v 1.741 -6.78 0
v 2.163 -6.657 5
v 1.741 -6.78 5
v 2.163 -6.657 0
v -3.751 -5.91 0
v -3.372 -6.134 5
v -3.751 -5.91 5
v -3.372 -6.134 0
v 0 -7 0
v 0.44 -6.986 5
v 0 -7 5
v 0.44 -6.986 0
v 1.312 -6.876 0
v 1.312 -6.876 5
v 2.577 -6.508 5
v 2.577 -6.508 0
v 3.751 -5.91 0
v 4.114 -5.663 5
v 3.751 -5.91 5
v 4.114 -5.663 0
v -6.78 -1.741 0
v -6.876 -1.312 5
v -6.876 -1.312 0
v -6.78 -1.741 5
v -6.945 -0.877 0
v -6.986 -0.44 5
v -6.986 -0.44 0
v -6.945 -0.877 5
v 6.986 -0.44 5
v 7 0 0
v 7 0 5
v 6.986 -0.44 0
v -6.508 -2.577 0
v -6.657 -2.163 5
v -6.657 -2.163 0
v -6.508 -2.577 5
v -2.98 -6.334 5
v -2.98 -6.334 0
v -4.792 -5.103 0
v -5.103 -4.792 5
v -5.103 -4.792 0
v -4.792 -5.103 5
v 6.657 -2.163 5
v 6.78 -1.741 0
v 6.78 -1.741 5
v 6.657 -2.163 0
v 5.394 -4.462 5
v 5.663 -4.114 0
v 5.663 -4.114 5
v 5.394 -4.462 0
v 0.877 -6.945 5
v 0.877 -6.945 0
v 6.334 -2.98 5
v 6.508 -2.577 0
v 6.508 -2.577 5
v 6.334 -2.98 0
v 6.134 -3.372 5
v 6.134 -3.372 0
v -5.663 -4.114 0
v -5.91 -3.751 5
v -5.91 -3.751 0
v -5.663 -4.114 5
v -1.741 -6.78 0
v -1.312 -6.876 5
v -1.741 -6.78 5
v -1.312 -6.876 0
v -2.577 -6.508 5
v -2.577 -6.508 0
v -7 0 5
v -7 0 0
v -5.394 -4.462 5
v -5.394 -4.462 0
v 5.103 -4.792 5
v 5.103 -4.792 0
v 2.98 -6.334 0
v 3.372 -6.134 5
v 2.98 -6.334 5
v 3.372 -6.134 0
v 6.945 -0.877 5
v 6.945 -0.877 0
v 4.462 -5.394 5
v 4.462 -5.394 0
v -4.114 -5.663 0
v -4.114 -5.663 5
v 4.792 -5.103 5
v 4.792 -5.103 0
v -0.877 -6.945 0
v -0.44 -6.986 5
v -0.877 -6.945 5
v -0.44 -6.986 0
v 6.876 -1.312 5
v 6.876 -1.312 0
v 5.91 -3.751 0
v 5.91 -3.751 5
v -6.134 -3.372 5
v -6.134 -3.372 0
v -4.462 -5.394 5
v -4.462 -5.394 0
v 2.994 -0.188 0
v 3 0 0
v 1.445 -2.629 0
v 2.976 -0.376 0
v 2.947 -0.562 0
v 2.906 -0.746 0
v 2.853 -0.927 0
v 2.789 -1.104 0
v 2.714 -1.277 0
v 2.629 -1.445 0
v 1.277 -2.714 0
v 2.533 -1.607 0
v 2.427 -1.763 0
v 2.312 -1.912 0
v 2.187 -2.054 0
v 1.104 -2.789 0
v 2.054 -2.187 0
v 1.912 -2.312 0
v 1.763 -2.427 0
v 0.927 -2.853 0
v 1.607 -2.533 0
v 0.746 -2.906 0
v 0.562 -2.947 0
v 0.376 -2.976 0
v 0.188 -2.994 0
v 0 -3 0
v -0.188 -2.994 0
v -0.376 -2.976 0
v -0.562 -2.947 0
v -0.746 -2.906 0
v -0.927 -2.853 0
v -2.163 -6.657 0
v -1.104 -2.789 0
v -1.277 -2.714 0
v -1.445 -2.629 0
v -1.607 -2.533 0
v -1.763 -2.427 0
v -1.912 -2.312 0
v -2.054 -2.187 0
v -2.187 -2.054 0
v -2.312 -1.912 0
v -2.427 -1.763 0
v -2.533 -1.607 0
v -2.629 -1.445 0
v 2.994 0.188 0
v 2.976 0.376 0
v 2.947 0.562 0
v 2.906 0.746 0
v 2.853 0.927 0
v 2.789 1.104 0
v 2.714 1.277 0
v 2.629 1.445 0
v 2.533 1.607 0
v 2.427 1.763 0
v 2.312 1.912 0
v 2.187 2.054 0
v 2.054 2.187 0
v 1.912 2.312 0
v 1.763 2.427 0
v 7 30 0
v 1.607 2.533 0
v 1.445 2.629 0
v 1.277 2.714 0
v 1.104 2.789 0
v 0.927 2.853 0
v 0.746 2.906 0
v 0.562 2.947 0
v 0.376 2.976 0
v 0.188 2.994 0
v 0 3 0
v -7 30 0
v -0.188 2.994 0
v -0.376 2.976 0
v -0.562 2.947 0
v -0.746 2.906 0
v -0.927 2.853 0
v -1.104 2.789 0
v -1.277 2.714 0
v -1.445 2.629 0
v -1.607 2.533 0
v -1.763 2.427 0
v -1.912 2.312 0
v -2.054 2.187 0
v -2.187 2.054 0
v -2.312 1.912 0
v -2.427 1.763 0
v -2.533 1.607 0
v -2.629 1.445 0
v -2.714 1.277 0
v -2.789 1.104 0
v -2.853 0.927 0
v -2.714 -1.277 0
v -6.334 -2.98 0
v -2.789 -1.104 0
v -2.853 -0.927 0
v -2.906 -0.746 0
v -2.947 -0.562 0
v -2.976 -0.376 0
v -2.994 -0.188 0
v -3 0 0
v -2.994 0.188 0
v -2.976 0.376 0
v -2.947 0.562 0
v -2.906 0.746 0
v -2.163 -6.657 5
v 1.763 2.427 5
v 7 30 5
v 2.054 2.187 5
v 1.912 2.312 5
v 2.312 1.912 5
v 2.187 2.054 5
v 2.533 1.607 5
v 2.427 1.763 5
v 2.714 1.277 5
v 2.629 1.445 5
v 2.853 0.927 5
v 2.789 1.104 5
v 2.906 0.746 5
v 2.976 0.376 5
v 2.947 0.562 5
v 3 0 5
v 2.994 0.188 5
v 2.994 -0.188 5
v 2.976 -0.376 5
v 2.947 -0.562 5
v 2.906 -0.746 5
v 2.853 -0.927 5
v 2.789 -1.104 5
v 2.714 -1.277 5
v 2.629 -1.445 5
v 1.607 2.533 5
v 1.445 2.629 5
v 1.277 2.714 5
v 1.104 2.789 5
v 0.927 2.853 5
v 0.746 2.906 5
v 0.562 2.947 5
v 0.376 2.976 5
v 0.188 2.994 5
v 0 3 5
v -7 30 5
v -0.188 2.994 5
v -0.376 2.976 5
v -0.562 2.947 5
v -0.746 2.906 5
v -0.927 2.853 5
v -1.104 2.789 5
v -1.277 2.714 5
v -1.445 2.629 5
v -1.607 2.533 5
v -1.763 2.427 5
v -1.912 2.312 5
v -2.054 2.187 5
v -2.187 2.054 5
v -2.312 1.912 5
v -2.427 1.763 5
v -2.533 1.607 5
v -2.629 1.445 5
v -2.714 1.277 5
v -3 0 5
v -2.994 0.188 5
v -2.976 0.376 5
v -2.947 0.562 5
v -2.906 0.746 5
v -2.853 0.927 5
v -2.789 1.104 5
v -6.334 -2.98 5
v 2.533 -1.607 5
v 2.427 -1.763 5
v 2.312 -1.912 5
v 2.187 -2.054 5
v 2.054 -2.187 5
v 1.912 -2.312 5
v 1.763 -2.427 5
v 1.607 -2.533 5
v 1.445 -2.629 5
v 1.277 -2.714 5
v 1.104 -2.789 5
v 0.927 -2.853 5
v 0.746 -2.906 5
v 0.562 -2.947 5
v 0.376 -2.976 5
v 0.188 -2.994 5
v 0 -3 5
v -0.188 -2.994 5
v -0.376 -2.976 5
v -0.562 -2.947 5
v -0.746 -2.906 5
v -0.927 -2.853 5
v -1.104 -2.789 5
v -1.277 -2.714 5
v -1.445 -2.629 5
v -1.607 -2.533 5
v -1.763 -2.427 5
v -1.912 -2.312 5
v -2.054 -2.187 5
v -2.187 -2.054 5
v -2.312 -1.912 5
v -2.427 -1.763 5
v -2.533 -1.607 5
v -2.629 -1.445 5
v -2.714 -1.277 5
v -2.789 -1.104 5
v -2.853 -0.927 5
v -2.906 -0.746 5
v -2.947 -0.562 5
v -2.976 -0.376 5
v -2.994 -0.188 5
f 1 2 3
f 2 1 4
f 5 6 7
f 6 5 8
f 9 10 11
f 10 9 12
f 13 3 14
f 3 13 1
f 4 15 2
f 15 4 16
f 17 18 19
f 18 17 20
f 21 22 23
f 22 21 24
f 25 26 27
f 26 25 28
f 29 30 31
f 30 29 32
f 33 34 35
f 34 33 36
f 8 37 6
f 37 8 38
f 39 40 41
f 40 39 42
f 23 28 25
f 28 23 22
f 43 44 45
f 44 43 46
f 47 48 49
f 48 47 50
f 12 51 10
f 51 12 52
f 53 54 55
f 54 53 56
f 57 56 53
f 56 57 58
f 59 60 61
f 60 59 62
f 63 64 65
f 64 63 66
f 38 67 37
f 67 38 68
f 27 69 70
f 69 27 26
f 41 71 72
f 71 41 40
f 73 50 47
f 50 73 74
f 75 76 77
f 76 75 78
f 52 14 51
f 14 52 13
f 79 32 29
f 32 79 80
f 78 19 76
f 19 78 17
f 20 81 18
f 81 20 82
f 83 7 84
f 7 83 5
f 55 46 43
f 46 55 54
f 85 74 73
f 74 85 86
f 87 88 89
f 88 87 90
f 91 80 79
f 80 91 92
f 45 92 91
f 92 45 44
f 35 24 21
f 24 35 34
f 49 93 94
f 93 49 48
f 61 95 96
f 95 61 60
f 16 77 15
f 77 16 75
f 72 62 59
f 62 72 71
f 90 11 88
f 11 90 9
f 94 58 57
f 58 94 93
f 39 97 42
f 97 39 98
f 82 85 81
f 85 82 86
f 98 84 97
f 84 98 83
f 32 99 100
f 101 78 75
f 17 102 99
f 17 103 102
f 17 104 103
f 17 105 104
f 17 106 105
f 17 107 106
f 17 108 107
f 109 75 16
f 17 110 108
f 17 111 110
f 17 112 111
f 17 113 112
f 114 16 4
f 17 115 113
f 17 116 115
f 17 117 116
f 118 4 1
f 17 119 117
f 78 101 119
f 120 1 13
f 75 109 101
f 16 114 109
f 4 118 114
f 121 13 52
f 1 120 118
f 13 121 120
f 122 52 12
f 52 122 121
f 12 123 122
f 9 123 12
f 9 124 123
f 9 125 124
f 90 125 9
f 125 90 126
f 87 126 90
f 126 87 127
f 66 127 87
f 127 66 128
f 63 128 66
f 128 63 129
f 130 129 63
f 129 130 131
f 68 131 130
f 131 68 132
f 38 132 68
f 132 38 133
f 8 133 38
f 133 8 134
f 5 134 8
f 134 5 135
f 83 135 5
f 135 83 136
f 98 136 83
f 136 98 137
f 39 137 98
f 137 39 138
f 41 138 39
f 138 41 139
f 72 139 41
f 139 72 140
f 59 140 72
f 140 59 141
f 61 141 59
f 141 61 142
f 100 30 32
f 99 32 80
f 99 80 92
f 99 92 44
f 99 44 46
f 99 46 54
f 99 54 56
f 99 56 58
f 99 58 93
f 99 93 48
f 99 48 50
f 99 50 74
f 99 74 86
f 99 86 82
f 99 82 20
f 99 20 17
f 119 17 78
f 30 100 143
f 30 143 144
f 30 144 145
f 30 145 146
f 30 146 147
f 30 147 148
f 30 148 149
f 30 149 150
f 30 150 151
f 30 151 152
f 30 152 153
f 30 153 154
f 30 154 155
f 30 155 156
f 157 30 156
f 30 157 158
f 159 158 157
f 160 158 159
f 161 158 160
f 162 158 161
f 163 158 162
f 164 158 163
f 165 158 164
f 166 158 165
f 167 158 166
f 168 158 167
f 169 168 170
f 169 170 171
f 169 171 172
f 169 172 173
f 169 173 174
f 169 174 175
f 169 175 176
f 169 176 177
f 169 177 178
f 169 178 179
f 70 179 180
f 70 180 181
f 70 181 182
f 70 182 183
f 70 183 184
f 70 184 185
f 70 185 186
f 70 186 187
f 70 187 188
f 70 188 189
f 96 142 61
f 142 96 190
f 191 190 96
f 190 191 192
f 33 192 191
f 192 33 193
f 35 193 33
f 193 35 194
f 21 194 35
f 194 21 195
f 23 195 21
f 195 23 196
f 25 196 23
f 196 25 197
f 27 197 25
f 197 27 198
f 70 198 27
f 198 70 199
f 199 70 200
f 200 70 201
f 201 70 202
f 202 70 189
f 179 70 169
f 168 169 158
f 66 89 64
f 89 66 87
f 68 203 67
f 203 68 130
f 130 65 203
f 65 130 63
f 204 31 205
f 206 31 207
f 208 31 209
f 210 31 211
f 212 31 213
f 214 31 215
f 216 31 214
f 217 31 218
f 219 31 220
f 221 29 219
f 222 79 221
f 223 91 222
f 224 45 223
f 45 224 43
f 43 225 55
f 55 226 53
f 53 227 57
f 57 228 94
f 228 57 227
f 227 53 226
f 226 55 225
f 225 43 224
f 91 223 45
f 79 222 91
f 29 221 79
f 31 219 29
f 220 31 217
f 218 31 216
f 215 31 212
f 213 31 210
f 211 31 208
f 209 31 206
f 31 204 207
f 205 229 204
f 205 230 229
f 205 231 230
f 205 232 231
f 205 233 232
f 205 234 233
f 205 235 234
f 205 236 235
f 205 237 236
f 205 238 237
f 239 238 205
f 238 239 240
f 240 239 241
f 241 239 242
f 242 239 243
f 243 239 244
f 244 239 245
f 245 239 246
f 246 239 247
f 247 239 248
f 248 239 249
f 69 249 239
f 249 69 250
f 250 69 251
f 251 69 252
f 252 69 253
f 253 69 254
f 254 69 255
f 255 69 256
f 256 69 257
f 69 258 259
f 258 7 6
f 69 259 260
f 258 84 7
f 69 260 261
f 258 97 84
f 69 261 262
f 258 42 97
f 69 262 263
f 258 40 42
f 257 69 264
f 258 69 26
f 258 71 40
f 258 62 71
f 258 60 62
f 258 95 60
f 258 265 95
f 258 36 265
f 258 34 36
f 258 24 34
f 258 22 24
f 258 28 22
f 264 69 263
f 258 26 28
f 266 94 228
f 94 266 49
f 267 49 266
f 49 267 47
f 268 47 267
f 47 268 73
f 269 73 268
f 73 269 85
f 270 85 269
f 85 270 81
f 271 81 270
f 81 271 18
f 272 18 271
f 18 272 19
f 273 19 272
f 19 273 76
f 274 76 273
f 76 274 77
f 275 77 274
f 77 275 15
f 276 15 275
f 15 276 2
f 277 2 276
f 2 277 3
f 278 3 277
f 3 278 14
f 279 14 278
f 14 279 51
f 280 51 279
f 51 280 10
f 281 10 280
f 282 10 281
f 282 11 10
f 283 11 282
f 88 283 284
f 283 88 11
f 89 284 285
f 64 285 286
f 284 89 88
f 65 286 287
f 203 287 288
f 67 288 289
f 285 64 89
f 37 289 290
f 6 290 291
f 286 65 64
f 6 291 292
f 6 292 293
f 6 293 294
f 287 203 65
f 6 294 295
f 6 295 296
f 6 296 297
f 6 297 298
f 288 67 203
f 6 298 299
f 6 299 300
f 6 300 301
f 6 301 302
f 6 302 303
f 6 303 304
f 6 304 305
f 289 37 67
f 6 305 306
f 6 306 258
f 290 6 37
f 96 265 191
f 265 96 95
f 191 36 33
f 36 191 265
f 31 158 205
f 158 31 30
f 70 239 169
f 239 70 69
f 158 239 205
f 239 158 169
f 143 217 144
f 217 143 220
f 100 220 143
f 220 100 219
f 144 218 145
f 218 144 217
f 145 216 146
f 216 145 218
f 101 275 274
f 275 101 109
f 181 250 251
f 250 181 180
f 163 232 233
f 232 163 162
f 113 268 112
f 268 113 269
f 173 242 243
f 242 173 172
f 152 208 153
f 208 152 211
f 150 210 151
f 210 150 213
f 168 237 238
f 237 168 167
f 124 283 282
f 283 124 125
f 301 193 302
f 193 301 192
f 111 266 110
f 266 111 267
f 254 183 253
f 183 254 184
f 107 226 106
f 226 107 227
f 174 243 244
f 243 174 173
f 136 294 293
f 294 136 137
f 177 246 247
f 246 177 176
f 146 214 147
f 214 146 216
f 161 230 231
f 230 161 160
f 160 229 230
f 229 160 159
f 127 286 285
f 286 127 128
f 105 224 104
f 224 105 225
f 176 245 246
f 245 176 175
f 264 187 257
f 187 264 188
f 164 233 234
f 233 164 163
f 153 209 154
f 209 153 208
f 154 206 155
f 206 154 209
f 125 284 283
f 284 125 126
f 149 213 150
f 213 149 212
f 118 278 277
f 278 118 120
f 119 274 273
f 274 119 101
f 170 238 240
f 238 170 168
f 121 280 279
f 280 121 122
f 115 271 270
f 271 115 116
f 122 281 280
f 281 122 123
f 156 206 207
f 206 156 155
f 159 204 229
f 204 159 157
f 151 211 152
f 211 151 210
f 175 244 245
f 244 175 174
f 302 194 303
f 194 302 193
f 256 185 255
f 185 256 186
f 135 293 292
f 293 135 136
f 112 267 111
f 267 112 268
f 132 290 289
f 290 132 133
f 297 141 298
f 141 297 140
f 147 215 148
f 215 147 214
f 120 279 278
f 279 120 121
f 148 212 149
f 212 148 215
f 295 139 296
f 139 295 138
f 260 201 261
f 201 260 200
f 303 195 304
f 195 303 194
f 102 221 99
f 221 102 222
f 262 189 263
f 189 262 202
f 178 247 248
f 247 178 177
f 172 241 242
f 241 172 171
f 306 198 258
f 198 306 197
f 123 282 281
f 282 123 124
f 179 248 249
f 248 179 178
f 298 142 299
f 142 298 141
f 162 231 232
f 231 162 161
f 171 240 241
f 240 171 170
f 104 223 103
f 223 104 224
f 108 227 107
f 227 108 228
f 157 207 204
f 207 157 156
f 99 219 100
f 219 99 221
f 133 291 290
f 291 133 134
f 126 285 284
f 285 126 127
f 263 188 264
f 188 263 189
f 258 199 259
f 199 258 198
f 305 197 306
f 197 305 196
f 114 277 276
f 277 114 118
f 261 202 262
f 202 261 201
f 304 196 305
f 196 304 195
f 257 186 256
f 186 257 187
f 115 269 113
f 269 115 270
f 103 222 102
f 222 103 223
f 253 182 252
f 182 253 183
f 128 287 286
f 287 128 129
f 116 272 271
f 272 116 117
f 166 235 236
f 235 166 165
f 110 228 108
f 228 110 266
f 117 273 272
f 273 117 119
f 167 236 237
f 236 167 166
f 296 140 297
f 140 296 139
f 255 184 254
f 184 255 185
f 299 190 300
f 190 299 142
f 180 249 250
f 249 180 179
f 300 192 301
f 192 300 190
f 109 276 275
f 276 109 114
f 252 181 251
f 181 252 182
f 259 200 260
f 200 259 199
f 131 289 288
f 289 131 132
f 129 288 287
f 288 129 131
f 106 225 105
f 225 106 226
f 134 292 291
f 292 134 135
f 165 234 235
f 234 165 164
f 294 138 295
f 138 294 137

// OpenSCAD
act_r = 10.5;
act_hole_r = 3;
act_hole_d_to_end = 4;
act_hole_d_to_box = 8;
act_len = act_hole_d_to_end+act_hole_d_to_box+2*act_hole_r;
box = [39,39,39];
act_hole_shaft_len = 50;
width = 5;
slop = 1;
upness = 30;

$fn = 100;

echo(act_len);

module actuator () {
  hole_goes=act_hole_d_to_box+act_hole_r;
  translate([-box[0],-box[1]/2,-box[2]/2]) cube(box);
  difference() {
    rotate([0,90,0]) cylinder(act_len, act_r, act_r);
    translate([hole_goes, act_hole_shaft_len/2 , 0 ])
      rotate([90,0,0])
      cylinder( act_hole_shaft_len, act_hole_r, act_hole_r); 
  }
}

module ear () {
  circler = act_hole_d_to_end+act_hole_r;
  difference () {
    union () {
      cylinder(width,circler,circler);
      translate([-circler,0,0]) cube([2*circler,upness,width]);
    }
    translate([0,0,-1]) {
      cylinder(width+2,act_hole_r,act_hole_r);
    }
  }
}

//translate([0,0,upness]) rotate([0,90,0]) %actuator();

ear();
